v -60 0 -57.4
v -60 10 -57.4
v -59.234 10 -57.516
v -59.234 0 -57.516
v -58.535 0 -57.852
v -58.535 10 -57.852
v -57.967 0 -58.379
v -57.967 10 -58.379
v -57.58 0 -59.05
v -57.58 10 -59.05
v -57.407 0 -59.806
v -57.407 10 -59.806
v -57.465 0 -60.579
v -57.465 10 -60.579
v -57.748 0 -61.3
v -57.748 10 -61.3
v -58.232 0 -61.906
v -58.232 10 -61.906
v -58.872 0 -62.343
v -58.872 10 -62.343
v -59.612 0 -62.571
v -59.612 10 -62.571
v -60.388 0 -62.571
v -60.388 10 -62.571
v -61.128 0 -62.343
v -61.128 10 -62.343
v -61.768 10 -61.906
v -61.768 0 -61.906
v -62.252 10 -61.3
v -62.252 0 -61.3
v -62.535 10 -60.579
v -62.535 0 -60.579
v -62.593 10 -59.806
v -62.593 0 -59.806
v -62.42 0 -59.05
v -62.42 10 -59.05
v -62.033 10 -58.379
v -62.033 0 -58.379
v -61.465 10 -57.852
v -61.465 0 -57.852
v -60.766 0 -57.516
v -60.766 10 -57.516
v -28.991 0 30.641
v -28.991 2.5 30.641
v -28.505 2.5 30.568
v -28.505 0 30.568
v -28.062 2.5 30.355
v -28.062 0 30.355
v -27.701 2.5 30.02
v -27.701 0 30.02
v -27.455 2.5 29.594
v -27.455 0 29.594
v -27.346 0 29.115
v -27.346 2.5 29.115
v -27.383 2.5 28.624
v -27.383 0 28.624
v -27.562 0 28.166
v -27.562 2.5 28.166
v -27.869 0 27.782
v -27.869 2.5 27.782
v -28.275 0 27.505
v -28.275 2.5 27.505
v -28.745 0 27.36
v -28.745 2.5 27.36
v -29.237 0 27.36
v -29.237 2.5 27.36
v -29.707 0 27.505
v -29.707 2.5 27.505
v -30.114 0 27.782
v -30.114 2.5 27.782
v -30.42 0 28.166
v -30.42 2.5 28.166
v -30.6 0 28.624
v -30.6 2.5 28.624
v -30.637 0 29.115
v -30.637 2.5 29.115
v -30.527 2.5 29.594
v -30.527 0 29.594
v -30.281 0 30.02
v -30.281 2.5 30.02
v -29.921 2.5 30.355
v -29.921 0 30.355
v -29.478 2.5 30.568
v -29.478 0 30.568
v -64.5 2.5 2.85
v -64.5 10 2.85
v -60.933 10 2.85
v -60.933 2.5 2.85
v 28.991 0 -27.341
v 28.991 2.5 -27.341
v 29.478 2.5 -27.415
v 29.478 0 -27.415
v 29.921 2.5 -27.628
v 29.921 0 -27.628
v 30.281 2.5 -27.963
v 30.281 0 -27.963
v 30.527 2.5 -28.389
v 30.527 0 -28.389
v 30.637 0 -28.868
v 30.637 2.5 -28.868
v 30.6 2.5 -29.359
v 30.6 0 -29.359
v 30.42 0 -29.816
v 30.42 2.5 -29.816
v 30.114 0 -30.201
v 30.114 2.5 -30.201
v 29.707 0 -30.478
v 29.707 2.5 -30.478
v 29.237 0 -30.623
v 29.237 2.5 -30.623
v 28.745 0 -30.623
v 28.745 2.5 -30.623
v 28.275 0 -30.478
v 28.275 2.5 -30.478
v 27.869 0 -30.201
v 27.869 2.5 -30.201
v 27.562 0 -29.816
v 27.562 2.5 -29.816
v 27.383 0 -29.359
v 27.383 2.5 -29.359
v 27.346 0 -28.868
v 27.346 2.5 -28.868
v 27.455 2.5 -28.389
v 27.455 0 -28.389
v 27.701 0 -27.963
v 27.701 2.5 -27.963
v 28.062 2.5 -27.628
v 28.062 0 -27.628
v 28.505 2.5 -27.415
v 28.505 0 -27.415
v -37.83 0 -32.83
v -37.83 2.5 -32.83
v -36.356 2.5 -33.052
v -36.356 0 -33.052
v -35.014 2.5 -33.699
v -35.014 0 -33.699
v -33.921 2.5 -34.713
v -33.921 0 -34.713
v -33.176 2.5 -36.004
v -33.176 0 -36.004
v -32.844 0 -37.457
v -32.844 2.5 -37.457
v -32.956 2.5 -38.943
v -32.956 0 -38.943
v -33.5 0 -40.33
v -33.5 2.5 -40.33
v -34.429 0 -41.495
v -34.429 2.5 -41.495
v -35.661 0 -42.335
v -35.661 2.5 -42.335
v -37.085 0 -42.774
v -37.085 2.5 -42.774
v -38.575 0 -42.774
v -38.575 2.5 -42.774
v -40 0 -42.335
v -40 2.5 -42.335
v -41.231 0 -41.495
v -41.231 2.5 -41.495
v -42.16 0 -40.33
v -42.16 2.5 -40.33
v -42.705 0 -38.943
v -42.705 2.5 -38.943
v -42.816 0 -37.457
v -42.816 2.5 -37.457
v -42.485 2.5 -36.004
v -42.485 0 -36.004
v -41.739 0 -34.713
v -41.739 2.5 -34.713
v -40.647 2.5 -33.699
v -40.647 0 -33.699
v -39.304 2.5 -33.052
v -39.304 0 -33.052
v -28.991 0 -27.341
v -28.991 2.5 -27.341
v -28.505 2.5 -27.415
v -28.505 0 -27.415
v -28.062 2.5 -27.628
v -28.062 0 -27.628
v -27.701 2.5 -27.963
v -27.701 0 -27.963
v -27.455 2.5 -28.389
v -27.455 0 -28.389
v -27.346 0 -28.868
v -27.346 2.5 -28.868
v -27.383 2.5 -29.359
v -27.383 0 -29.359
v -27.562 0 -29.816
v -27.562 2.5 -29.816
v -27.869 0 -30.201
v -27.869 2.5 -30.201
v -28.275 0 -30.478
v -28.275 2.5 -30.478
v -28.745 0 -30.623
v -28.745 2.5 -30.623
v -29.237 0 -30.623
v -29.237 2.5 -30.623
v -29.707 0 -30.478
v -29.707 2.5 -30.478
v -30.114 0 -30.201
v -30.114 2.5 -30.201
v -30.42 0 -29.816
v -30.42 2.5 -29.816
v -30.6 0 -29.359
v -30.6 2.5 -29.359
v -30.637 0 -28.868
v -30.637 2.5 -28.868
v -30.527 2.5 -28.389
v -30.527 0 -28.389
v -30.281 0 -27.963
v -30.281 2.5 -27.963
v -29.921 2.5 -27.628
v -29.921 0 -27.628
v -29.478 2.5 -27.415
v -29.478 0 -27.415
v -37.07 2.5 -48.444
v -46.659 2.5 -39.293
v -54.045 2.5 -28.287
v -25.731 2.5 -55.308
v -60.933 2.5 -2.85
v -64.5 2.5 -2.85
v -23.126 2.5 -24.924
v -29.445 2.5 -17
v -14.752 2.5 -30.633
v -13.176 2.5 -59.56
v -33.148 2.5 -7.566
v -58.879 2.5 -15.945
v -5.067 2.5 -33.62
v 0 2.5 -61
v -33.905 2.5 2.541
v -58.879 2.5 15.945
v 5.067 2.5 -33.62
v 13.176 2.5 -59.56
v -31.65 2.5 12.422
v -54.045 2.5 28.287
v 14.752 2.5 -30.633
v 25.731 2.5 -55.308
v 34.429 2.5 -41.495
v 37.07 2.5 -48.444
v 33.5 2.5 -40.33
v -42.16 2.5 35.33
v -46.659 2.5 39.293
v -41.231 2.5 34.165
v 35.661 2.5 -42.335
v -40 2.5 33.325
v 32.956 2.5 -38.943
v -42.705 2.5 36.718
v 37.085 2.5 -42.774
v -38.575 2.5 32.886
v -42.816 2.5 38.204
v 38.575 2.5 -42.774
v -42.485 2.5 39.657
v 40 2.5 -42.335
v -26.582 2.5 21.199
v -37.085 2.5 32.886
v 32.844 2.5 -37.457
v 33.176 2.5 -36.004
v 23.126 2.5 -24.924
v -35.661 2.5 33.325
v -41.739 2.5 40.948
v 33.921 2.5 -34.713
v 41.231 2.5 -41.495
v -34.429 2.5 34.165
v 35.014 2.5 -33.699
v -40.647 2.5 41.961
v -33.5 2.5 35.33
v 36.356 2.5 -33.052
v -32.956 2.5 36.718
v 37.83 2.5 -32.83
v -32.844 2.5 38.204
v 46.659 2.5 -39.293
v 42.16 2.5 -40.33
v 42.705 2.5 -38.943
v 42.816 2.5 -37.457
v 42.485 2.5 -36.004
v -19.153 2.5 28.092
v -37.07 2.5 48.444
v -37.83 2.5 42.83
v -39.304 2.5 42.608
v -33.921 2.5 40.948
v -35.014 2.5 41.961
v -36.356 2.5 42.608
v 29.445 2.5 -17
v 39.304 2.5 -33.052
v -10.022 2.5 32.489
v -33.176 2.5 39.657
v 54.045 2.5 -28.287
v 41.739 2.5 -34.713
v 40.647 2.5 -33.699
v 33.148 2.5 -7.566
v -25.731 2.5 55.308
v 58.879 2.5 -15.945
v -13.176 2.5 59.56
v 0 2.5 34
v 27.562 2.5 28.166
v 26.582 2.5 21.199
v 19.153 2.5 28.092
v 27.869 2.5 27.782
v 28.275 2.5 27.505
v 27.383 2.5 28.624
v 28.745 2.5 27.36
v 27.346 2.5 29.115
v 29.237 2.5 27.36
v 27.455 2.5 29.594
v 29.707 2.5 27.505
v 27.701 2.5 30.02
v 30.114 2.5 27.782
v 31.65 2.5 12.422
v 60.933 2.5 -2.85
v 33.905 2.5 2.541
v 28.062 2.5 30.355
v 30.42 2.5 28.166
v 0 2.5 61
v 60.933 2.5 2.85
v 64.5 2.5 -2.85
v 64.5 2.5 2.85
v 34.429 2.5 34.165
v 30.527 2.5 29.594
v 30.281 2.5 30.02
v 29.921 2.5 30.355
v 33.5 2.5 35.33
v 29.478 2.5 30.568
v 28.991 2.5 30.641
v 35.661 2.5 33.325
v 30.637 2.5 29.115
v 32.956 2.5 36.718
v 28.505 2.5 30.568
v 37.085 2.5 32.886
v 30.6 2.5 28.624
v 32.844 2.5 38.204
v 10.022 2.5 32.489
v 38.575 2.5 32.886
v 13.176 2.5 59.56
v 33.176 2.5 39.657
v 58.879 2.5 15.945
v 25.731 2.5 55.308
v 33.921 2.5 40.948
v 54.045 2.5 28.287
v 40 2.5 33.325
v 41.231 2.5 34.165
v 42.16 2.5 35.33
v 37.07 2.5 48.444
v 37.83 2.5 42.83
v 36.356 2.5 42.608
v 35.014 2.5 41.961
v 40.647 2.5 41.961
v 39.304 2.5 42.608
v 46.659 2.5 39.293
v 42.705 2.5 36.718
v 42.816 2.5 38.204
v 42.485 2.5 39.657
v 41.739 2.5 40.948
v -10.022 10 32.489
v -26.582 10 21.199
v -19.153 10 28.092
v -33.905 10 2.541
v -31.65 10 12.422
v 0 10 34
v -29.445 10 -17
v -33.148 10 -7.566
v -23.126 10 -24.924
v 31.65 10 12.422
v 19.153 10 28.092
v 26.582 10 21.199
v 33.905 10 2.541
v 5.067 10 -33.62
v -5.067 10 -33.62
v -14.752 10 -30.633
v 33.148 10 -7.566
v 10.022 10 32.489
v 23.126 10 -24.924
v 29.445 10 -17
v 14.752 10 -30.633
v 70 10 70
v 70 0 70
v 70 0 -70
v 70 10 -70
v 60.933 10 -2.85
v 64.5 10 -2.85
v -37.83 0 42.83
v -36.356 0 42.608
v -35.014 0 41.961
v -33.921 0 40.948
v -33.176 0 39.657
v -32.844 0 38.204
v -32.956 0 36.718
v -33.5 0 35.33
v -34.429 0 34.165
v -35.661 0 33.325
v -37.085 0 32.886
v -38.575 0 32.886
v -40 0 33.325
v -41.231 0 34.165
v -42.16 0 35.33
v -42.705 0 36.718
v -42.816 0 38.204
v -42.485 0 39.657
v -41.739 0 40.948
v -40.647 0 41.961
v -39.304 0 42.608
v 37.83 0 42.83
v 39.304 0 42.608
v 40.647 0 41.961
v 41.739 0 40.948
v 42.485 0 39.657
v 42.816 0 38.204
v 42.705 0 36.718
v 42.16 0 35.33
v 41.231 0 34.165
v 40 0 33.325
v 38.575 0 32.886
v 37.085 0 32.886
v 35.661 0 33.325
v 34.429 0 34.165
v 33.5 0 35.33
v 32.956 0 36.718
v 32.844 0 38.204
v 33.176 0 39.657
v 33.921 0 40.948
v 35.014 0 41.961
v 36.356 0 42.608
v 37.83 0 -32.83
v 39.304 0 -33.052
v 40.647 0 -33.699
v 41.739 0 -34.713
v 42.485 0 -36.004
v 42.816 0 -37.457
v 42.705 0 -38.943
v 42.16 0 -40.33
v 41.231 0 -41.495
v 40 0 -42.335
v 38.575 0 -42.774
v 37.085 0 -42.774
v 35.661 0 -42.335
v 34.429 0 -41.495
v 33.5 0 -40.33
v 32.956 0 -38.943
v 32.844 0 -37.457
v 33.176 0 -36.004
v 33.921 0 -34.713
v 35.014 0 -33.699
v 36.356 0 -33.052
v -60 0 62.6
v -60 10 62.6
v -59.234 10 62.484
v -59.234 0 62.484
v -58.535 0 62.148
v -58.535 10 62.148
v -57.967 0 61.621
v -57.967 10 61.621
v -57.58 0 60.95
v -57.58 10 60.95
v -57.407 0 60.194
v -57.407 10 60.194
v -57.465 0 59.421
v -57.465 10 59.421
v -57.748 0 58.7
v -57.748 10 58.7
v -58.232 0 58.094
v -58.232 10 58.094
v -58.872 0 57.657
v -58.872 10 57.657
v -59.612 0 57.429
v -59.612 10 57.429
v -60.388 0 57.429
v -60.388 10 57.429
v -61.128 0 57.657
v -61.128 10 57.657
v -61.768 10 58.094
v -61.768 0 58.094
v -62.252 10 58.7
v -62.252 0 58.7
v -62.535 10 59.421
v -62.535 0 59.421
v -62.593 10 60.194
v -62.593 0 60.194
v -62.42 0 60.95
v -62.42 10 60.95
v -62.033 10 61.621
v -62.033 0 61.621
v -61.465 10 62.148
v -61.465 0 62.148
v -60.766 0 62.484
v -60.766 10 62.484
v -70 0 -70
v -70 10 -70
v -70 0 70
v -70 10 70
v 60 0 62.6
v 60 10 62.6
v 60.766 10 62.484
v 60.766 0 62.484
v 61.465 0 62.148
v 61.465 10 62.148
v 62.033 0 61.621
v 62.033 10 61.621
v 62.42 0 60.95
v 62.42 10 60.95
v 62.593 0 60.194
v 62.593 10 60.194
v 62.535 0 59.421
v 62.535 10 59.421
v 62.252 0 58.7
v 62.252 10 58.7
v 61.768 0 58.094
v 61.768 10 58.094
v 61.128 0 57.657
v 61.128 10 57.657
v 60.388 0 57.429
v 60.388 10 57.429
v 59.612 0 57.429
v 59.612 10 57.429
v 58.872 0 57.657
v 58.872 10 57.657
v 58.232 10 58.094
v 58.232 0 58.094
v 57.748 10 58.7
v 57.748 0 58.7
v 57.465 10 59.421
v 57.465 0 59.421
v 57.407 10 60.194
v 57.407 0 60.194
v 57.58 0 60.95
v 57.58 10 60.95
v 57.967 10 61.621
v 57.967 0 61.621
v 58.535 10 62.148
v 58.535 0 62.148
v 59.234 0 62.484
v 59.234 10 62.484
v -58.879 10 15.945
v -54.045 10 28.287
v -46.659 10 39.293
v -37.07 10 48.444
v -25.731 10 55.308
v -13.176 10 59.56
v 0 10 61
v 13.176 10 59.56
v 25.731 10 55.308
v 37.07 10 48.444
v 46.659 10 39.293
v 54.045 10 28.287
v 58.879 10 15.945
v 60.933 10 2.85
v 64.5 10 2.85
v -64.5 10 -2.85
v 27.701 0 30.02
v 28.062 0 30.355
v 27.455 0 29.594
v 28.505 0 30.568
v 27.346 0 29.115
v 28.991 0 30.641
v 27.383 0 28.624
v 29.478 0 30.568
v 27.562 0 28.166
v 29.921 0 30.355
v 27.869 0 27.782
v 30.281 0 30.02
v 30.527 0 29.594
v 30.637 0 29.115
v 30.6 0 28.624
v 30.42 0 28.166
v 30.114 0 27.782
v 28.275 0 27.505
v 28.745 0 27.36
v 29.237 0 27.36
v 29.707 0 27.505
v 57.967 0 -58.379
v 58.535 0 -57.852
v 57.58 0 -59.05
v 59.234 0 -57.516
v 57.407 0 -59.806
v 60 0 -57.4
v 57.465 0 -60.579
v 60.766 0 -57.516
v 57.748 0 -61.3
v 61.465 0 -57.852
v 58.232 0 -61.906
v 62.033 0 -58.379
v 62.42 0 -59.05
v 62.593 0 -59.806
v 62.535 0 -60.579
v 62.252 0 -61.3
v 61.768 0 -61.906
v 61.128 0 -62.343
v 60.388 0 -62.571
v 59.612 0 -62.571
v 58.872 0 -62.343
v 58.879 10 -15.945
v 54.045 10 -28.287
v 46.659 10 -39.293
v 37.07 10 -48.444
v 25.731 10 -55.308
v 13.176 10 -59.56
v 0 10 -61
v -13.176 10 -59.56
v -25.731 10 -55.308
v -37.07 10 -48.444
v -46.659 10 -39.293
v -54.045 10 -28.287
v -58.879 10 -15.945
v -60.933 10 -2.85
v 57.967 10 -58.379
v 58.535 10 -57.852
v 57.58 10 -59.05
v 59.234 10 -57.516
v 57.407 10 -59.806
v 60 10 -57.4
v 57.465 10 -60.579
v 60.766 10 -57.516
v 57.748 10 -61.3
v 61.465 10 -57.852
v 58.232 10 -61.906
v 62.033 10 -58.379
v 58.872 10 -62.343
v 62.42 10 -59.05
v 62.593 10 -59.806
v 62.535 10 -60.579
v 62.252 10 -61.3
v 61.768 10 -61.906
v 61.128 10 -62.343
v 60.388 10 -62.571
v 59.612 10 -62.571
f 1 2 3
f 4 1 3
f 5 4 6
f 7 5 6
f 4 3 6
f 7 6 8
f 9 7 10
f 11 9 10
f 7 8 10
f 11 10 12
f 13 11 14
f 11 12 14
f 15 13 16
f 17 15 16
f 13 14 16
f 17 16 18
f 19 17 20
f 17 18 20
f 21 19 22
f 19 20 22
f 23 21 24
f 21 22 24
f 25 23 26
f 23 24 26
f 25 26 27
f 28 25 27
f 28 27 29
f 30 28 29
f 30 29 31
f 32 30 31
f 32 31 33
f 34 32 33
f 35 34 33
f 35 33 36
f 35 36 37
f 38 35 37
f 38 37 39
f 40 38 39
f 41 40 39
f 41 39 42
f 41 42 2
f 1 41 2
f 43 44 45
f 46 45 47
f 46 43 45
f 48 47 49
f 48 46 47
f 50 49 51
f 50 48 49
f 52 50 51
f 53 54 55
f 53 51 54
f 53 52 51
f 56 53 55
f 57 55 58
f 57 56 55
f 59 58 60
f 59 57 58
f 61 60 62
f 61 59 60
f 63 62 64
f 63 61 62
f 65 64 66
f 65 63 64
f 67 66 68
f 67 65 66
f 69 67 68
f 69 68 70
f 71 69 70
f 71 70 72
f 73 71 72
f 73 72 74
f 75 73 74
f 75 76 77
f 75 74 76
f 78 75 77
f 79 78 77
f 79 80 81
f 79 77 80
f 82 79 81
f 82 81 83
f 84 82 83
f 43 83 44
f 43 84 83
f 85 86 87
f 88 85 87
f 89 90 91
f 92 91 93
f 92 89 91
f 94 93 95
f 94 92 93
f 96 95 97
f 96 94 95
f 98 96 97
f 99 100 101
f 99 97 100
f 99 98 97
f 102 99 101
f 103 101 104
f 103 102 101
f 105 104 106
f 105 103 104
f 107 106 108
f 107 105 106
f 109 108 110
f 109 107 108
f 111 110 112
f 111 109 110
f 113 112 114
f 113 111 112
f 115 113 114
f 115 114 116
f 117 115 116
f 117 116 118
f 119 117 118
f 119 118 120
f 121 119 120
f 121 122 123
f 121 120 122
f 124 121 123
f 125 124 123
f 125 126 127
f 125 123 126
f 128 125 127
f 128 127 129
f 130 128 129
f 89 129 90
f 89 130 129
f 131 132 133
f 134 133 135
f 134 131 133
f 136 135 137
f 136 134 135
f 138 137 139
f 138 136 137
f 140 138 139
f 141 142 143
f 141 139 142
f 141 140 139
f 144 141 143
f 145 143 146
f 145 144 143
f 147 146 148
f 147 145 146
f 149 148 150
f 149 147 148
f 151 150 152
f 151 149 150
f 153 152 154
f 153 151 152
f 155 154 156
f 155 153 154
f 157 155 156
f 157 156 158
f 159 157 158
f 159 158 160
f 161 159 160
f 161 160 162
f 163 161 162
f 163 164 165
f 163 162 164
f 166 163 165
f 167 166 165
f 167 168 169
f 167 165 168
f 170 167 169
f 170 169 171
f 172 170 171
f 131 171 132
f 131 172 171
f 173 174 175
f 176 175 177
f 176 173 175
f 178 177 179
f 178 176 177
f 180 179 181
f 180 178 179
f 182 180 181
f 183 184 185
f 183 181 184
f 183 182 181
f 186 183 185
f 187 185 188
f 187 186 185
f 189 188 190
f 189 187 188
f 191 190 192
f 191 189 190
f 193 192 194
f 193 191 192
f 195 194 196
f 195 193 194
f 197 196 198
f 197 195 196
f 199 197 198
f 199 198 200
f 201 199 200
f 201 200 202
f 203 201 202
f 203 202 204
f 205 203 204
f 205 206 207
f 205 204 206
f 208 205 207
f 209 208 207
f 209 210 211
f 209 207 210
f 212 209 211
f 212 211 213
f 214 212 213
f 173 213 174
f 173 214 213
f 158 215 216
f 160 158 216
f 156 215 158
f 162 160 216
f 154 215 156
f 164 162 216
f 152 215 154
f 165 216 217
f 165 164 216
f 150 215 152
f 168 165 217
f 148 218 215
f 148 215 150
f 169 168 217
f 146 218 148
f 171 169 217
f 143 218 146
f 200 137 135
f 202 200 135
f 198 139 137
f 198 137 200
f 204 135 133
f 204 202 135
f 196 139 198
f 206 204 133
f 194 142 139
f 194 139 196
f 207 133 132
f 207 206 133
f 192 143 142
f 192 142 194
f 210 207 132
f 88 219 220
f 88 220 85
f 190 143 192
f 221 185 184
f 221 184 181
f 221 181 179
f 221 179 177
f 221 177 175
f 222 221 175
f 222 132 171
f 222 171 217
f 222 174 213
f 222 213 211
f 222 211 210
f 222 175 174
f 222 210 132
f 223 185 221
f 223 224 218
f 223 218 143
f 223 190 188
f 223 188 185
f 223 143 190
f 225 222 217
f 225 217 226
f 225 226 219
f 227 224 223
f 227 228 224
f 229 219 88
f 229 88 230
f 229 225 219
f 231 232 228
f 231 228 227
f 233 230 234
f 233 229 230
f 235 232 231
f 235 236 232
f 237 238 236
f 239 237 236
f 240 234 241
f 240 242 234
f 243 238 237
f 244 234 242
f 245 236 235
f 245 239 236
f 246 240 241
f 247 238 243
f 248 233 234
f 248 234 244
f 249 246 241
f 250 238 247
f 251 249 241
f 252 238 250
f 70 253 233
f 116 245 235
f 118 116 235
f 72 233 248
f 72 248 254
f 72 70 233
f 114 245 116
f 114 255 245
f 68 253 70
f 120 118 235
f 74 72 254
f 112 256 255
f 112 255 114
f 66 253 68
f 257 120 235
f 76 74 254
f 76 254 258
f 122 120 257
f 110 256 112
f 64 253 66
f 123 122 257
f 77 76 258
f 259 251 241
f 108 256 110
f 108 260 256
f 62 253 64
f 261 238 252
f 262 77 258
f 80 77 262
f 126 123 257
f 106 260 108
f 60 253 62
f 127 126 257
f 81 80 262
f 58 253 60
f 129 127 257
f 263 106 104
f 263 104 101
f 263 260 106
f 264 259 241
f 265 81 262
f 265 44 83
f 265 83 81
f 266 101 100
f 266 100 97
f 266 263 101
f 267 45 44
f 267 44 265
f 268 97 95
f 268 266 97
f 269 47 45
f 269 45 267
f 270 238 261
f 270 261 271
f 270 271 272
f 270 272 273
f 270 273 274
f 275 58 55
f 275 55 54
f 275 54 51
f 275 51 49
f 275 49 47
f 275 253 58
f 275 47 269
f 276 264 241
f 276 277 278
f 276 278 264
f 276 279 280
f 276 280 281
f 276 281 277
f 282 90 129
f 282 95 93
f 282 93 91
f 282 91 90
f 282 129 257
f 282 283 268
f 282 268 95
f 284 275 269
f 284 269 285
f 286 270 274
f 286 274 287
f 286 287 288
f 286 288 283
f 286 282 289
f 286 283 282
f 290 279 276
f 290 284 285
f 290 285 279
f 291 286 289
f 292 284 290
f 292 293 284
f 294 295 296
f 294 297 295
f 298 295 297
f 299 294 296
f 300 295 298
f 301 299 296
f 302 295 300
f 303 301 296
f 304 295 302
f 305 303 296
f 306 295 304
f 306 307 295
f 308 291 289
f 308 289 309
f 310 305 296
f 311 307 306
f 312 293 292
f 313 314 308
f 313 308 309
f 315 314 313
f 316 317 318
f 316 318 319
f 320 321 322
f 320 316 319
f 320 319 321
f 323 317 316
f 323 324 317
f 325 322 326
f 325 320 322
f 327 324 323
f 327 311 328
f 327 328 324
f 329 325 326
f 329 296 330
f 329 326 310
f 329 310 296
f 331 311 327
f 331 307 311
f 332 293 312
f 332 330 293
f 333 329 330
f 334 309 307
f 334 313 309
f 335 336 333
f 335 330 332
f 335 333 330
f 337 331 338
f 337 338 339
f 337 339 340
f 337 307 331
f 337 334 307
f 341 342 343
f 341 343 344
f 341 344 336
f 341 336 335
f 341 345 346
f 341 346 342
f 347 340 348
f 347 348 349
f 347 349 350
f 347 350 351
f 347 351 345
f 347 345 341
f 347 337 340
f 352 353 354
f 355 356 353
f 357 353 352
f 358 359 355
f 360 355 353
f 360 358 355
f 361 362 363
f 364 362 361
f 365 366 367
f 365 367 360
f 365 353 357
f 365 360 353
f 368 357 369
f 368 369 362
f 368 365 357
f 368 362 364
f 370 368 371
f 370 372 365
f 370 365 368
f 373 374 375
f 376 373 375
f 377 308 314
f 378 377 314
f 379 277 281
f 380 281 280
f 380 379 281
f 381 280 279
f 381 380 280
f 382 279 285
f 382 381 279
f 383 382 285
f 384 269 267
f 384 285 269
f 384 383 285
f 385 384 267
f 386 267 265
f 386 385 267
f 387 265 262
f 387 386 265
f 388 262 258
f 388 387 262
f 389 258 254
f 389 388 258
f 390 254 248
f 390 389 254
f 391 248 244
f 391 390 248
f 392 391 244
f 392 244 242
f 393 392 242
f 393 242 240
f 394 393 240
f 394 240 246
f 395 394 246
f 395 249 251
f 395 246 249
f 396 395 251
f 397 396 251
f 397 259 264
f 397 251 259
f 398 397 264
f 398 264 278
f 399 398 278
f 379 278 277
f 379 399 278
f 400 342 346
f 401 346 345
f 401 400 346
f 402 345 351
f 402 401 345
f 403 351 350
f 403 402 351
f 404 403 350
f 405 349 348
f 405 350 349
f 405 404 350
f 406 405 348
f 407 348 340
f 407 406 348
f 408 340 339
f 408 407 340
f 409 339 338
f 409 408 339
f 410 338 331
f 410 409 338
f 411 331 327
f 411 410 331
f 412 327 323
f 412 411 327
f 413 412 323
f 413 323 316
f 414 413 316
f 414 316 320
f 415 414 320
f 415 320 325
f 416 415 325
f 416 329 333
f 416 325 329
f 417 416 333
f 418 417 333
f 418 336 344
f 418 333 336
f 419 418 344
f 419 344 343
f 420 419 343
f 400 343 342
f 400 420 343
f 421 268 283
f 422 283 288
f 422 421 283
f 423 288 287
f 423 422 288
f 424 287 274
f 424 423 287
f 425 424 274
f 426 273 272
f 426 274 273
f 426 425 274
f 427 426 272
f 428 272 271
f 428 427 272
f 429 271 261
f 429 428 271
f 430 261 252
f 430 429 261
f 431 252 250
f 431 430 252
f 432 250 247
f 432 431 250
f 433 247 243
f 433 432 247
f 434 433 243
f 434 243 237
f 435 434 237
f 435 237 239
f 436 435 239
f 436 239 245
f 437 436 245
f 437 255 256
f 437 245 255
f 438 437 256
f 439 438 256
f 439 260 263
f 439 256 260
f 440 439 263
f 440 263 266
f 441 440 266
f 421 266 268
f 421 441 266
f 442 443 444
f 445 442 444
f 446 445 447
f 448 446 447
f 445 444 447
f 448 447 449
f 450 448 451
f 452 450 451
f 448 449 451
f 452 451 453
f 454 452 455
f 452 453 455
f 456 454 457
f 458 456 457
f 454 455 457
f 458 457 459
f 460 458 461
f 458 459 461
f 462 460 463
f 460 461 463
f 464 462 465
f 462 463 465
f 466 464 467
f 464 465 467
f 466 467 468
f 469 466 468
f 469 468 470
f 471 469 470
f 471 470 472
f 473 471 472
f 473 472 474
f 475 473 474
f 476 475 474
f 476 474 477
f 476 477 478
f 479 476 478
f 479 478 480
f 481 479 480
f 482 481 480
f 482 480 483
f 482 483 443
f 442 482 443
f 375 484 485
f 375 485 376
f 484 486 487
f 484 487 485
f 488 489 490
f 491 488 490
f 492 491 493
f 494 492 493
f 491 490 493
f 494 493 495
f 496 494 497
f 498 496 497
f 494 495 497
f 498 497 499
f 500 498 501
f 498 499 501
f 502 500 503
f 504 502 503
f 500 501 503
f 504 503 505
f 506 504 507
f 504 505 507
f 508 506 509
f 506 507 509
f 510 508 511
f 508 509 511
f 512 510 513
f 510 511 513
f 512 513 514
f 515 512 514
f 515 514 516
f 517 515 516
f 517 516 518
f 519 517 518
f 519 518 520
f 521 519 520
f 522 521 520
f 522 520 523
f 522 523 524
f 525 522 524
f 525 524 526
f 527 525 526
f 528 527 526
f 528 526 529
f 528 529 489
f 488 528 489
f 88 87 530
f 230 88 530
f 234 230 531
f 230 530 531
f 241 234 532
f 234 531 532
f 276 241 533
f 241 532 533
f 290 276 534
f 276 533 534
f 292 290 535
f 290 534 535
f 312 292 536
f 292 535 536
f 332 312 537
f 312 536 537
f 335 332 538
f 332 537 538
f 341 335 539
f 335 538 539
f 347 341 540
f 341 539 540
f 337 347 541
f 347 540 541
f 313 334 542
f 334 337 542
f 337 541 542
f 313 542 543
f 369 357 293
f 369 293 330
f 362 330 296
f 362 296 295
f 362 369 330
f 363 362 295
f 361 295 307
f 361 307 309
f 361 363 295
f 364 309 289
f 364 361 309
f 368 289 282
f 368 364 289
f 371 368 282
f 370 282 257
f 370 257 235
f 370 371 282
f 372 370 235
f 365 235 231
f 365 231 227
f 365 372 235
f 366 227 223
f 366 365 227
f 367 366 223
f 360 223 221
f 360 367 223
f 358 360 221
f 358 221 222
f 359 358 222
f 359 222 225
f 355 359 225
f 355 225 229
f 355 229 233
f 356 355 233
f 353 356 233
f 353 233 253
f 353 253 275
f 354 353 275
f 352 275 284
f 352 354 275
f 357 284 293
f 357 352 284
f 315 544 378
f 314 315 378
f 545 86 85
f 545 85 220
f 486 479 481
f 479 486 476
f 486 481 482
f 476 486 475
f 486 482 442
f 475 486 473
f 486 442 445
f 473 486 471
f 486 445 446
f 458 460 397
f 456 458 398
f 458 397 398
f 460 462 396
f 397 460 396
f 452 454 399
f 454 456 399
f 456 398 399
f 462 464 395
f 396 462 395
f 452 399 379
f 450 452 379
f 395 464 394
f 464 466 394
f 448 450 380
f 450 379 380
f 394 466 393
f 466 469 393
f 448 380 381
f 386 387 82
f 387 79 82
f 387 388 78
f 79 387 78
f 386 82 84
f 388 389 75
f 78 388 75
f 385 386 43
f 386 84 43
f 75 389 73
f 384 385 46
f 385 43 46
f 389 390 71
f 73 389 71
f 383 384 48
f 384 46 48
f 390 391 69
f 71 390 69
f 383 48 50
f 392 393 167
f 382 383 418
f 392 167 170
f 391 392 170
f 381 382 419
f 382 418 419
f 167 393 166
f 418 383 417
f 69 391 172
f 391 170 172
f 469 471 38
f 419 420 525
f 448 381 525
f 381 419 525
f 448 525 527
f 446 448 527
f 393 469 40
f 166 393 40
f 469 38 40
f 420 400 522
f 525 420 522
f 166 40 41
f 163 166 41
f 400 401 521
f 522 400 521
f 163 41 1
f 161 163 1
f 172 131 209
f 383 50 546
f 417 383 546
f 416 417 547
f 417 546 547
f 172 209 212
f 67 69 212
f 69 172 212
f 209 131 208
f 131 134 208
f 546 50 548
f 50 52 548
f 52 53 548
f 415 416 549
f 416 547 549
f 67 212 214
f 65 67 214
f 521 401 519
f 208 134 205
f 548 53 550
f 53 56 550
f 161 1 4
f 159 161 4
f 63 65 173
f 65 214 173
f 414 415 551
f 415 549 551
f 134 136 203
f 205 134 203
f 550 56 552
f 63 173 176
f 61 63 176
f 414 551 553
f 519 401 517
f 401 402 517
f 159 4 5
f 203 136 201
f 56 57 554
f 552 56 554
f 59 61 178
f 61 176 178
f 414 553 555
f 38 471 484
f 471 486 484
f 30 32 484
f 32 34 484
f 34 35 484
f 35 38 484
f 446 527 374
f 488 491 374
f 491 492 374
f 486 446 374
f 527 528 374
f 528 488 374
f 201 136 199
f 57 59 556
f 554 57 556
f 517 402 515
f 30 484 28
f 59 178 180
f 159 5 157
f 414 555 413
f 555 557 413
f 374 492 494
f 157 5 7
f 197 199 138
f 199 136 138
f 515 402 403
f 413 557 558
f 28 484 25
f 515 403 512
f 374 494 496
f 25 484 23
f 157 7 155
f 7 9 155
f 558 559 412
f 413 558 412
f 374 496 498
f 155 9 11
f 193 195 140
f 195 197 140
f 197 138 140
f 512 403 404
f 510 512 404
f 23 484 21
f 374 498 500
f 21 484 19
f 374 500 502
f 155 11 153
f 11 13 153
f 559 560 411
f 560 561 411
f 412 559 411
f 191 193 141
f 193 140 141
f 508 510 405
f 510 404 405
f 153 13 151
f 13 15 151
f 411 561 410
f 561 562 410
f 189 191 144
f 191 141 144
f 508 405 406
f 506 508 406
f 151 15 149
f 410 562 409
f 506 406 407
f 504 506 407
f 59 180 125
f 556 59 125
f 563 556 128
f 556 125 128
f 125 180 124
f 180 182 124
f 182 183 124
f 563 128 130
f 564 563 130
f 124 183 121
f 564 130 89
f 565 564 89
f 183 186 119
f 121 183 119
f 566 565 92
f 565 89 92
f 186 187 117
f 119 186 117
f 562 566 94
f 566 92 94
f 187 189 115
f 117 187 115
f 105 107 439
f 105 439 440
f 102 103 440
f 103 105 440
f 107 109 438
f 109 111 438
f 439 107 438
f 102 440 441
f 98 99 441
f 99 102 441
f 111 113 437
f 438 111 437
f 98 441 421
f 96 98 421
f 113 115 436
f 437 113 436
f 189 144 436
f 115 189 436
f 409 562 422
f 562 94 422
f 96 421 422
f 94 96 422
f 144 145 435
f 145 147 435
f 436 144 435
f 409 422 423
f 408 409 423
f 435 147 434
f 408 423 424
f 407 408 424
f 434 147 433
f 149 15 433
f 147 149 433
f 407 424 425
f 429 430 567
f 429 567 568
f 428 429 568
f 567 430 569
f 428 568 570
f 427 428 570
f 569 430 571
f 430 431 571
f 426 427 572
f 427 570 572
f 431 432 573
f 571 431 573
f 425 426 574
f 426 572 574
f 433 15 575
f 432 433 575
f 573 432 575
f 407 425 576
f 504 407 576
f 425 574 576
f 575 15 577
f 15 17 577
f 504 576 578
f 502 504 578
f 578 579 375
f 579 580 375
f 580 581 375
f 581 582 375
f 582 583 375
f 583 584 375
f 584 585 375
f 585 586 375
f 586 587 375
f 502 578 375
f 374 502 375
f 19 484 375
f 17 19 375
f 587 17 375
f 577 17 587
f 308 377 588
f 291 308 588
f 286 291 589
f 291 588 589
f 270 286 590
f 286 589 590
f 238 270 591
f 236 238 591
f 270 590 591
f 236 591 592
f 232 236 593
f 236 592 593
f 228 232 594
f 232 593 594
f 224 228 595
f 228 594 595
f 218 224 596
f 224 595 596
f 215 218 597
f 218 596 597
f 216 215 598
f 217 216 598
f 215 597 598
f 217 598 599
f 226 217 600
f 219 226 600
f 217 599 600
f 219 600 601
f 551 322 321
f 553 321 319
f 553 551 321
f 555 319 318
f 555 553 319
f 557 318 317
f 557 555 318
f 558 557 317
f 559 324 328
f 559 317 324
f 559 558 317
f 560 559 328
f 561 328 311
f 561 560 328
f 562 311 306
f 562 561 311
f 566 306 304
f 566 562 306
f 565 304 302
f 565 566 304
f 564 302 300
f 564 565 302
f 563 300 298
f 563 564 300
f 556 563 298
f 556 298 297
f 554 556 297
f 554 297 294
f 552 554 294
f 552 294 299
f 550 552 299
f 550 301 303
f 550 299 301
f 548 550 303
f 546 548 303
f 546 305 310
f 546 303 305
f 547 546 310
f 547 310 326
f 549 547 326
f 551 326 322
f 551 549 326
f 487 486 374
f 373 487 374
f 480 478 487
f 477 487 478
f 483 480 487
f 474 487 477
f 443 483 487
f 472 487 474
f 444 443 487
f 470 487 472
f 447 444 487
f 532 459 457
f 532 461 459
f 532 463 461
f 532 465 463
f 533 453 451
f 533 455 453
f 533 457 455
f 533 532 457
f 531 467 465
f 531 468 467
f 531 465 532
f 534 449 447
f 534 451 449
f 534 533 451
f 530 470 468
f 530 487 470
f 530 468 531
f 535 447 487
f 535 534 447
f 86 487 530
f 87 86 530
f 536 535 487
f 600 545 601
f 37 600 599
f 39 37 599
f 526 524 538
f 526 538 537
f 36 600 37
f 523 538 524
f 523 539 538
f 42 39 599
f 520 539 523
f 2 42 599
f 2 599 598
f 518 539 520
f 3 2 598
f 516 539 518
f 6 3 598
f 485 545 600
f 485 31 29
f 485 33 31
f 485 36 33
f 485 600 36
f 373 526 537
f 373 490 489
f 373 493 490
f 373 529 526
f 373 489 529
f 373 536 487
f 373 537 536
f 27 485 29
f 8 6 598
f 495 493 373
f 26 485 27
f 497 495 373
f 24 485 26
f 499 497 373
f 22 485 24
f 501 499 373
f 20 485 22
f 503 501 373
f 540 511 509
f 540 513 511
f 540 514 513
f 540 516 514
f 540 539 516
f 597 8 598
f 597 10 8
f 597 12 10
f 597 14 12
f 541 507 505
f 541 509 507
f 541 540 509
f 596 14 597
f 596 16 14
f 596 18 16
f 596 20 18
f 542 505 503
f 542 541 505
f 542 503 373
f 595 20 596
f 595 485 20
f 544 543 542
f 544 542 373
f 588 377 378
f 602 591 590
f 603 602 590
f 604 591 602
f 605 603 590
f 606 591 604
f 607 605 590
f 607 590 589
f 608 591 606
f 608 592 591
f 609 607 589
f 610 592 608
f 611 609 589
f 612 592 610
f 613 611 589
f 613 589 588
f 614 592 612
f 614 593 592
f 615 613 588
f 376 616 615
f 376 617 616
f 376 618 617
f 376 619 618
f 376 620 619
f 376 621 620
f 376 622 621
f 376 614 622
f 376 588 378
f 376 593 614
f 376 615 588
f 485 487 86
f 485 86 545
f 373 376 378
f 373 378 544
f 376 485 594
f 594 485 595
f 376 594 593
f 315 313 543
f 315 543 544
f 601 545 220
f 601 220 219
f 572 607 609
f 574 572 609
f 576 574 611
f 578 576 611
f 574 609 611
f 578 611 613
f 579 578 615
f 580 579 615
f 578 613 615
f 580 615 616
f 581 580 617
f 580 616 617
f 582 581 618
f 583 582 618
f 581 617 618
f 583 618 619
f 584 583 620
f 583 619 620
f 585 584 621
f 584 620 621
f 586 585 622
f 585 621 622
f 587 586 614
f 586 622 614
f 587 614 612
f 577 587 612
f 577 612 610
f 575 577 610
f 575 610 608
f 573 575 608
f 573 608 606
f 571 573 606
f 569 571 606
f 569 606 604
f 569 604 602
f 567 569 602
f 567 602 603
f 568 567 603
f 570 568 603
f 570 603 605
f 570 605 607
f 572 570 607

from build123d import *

# Parameters (mm, degrees)
SKETCH_1_W          = 140
SKETCH_1_H          = 140
SKETCH_1_R          = 5
SKETCH_1_R_2        = 1.65
EXTRUDE_1_DEPTH     = 10
SKETCH_2_R          = 2.6
CUT_EXTRUDE_1_DEPTH = 100.498743711
SKETCH_3_R          = 61
SKETCH_3_R_2        = 46
CUT_EXTRUDE_2_DEPTH = 7.5
SKETCH_4_R          = 46
SKETCH_4_R_2        = 34
CUT_EXTRUDE_3_DEPTH = 7.5
SKETCH_5_W          = 7
SKETCH_5_H          = 5.7
CUT_EXTRUDE_4_DEPTH = 7.5


with BuildPart() as part:
    # 草图1 → 凸台-拉伸1 (new body)
    with BuildSketch(Plane(origin=(0, 0, 0), x_dir=(1, 0, 0), z_dir=(0, 1, 0))):
        Rectangle(SKETCH_1_W, SKETCH_1_H)
        with Locations(Location((-37.830212793, 37.830212793, 0), (0, 0, 270))):
            Circle(SKETCH_1_R, mode=Mode.SUBTRACT)
        with Locations(Location((-28.991378029, 28.991378029, 0), (0, 0, 270))):
            Circle(SKETCH_1_R_2, mode=Mode.SUBTRACT)
        with Locations(Location((28.991378029, 28.991378029, 0), (0, 0, 270))):
            Circle(SKETCH_1_R_2, mode=Mode.SUBTRACT)
        with Locations(Location((37.830212793, 37.830212793, 0), (0, 0, 270))):
            Circle(SKETCH_1_R, mode=Mode.SUBTRACT)
        with Locations(Location((28.991378029, -28.991378029, 0), (0, 0, 270))):
            Circle(SKETCH_1_R_2, mode=Mode.SUBTRACT)
        with Locations(Location((37.830212793, -37.830212793, 0), (0, 0, 270))):
            Circle(SKETCH_1_R, mode=Mode.SUBTRACT)
        with Locations(Location((-28.991378029, -28.991378029, 0), (0, 0, 270))):
            Circle(SKETCH_1_R_2, mode=Mode.SUBTRACT)
        with Locations(Location((-37.830212793, -37.830212793, 0), (0, 0, 270))):
            Circle(SKETCH_1_R, mode=Mode.SUBTRACT)
    extrude(amount=EXTRUDE_1_DEPTH)

    # 草图2 → 切除-拉伸1 (cut, through all)
    with BuildSketch(Plane(origin=(0, 10, 0), x_dir=(1, 0, 0), z_dir=(0, 1, 0))):
        with Locations(Location((-60, 60, 0), (0, 0, 270))):
            Circle(SKETCH_2_R)
        with Locations(Location((60, 60, 0), (0, 0, 270))):
            Circle(SKETCH_2_R)
        with Locations(Location((60, -60, 0), (0, 0, 270))):
            Circle(SKETCH_2_R)
        with Locations(Location((-60, -60, 0), (0, 0, 270))):
            Circle(SKETCH_2_R)
    extrude(amount=-CUT_EXTRUDE_1_DEPTH, mode=Mode.SUBTRACT)

    # 草图3 → 切除-拉伸2 (cut)
    with BuildSketch(Plane(origin=(0, 10, 0), x_dir=(1, 0, 0), z_dir=(0, 1, 0))):
        with Locations(Location((0, 0, 0), (0, 0, 270))):
            Circle(SKETCH_3_R)
        with Locations(Location((0, 0, 0), (0, 0, 270))):
            Circle(SKETCH_3_R_2, mode=Mode.SUBTRACT)
    extrude(amount=-CUT_EXTRUDE_2_DEPTH, mode=Mode.SUBTRACT)

    # 草图4 → 切除-拉伸3 (cut)
    with BuildSketch(Plane(origin=(0, 10, 0), x_dir=(1, 0, 0), z_dir=(0, 1, 0))):
        Circle(SKETCH_4_R)
        with Locations(Location((0, 0, 0), (0, 0, 270))):
            Circle(SKETCH_4_R_2, mode=Mode.SUBTRACT)
    extrude(amount=-CUT_EXTRUDE_3_DEPTH, mode=Mode.SUBTRACT)

    # 草图5 → 切除-拉伸4 (cut)
    with BuildSketch(Plane(origin=(0, 10, 0), x_dir=(1, 0, 0), z_dir=(0, 1, 0))):
        with Locations((-61, 0)):
            Rectangle(SKETCH_5_W, SKETCH_5_H)
        with Locations((61, 0)):
            Rectangle(SKETCH_5_W, SKETCH_5_H)
    extrude(amount=-CUT_EXTRUDE_4_DEPTH, mode=Mode.SUBTRACT)


solid = part.part
